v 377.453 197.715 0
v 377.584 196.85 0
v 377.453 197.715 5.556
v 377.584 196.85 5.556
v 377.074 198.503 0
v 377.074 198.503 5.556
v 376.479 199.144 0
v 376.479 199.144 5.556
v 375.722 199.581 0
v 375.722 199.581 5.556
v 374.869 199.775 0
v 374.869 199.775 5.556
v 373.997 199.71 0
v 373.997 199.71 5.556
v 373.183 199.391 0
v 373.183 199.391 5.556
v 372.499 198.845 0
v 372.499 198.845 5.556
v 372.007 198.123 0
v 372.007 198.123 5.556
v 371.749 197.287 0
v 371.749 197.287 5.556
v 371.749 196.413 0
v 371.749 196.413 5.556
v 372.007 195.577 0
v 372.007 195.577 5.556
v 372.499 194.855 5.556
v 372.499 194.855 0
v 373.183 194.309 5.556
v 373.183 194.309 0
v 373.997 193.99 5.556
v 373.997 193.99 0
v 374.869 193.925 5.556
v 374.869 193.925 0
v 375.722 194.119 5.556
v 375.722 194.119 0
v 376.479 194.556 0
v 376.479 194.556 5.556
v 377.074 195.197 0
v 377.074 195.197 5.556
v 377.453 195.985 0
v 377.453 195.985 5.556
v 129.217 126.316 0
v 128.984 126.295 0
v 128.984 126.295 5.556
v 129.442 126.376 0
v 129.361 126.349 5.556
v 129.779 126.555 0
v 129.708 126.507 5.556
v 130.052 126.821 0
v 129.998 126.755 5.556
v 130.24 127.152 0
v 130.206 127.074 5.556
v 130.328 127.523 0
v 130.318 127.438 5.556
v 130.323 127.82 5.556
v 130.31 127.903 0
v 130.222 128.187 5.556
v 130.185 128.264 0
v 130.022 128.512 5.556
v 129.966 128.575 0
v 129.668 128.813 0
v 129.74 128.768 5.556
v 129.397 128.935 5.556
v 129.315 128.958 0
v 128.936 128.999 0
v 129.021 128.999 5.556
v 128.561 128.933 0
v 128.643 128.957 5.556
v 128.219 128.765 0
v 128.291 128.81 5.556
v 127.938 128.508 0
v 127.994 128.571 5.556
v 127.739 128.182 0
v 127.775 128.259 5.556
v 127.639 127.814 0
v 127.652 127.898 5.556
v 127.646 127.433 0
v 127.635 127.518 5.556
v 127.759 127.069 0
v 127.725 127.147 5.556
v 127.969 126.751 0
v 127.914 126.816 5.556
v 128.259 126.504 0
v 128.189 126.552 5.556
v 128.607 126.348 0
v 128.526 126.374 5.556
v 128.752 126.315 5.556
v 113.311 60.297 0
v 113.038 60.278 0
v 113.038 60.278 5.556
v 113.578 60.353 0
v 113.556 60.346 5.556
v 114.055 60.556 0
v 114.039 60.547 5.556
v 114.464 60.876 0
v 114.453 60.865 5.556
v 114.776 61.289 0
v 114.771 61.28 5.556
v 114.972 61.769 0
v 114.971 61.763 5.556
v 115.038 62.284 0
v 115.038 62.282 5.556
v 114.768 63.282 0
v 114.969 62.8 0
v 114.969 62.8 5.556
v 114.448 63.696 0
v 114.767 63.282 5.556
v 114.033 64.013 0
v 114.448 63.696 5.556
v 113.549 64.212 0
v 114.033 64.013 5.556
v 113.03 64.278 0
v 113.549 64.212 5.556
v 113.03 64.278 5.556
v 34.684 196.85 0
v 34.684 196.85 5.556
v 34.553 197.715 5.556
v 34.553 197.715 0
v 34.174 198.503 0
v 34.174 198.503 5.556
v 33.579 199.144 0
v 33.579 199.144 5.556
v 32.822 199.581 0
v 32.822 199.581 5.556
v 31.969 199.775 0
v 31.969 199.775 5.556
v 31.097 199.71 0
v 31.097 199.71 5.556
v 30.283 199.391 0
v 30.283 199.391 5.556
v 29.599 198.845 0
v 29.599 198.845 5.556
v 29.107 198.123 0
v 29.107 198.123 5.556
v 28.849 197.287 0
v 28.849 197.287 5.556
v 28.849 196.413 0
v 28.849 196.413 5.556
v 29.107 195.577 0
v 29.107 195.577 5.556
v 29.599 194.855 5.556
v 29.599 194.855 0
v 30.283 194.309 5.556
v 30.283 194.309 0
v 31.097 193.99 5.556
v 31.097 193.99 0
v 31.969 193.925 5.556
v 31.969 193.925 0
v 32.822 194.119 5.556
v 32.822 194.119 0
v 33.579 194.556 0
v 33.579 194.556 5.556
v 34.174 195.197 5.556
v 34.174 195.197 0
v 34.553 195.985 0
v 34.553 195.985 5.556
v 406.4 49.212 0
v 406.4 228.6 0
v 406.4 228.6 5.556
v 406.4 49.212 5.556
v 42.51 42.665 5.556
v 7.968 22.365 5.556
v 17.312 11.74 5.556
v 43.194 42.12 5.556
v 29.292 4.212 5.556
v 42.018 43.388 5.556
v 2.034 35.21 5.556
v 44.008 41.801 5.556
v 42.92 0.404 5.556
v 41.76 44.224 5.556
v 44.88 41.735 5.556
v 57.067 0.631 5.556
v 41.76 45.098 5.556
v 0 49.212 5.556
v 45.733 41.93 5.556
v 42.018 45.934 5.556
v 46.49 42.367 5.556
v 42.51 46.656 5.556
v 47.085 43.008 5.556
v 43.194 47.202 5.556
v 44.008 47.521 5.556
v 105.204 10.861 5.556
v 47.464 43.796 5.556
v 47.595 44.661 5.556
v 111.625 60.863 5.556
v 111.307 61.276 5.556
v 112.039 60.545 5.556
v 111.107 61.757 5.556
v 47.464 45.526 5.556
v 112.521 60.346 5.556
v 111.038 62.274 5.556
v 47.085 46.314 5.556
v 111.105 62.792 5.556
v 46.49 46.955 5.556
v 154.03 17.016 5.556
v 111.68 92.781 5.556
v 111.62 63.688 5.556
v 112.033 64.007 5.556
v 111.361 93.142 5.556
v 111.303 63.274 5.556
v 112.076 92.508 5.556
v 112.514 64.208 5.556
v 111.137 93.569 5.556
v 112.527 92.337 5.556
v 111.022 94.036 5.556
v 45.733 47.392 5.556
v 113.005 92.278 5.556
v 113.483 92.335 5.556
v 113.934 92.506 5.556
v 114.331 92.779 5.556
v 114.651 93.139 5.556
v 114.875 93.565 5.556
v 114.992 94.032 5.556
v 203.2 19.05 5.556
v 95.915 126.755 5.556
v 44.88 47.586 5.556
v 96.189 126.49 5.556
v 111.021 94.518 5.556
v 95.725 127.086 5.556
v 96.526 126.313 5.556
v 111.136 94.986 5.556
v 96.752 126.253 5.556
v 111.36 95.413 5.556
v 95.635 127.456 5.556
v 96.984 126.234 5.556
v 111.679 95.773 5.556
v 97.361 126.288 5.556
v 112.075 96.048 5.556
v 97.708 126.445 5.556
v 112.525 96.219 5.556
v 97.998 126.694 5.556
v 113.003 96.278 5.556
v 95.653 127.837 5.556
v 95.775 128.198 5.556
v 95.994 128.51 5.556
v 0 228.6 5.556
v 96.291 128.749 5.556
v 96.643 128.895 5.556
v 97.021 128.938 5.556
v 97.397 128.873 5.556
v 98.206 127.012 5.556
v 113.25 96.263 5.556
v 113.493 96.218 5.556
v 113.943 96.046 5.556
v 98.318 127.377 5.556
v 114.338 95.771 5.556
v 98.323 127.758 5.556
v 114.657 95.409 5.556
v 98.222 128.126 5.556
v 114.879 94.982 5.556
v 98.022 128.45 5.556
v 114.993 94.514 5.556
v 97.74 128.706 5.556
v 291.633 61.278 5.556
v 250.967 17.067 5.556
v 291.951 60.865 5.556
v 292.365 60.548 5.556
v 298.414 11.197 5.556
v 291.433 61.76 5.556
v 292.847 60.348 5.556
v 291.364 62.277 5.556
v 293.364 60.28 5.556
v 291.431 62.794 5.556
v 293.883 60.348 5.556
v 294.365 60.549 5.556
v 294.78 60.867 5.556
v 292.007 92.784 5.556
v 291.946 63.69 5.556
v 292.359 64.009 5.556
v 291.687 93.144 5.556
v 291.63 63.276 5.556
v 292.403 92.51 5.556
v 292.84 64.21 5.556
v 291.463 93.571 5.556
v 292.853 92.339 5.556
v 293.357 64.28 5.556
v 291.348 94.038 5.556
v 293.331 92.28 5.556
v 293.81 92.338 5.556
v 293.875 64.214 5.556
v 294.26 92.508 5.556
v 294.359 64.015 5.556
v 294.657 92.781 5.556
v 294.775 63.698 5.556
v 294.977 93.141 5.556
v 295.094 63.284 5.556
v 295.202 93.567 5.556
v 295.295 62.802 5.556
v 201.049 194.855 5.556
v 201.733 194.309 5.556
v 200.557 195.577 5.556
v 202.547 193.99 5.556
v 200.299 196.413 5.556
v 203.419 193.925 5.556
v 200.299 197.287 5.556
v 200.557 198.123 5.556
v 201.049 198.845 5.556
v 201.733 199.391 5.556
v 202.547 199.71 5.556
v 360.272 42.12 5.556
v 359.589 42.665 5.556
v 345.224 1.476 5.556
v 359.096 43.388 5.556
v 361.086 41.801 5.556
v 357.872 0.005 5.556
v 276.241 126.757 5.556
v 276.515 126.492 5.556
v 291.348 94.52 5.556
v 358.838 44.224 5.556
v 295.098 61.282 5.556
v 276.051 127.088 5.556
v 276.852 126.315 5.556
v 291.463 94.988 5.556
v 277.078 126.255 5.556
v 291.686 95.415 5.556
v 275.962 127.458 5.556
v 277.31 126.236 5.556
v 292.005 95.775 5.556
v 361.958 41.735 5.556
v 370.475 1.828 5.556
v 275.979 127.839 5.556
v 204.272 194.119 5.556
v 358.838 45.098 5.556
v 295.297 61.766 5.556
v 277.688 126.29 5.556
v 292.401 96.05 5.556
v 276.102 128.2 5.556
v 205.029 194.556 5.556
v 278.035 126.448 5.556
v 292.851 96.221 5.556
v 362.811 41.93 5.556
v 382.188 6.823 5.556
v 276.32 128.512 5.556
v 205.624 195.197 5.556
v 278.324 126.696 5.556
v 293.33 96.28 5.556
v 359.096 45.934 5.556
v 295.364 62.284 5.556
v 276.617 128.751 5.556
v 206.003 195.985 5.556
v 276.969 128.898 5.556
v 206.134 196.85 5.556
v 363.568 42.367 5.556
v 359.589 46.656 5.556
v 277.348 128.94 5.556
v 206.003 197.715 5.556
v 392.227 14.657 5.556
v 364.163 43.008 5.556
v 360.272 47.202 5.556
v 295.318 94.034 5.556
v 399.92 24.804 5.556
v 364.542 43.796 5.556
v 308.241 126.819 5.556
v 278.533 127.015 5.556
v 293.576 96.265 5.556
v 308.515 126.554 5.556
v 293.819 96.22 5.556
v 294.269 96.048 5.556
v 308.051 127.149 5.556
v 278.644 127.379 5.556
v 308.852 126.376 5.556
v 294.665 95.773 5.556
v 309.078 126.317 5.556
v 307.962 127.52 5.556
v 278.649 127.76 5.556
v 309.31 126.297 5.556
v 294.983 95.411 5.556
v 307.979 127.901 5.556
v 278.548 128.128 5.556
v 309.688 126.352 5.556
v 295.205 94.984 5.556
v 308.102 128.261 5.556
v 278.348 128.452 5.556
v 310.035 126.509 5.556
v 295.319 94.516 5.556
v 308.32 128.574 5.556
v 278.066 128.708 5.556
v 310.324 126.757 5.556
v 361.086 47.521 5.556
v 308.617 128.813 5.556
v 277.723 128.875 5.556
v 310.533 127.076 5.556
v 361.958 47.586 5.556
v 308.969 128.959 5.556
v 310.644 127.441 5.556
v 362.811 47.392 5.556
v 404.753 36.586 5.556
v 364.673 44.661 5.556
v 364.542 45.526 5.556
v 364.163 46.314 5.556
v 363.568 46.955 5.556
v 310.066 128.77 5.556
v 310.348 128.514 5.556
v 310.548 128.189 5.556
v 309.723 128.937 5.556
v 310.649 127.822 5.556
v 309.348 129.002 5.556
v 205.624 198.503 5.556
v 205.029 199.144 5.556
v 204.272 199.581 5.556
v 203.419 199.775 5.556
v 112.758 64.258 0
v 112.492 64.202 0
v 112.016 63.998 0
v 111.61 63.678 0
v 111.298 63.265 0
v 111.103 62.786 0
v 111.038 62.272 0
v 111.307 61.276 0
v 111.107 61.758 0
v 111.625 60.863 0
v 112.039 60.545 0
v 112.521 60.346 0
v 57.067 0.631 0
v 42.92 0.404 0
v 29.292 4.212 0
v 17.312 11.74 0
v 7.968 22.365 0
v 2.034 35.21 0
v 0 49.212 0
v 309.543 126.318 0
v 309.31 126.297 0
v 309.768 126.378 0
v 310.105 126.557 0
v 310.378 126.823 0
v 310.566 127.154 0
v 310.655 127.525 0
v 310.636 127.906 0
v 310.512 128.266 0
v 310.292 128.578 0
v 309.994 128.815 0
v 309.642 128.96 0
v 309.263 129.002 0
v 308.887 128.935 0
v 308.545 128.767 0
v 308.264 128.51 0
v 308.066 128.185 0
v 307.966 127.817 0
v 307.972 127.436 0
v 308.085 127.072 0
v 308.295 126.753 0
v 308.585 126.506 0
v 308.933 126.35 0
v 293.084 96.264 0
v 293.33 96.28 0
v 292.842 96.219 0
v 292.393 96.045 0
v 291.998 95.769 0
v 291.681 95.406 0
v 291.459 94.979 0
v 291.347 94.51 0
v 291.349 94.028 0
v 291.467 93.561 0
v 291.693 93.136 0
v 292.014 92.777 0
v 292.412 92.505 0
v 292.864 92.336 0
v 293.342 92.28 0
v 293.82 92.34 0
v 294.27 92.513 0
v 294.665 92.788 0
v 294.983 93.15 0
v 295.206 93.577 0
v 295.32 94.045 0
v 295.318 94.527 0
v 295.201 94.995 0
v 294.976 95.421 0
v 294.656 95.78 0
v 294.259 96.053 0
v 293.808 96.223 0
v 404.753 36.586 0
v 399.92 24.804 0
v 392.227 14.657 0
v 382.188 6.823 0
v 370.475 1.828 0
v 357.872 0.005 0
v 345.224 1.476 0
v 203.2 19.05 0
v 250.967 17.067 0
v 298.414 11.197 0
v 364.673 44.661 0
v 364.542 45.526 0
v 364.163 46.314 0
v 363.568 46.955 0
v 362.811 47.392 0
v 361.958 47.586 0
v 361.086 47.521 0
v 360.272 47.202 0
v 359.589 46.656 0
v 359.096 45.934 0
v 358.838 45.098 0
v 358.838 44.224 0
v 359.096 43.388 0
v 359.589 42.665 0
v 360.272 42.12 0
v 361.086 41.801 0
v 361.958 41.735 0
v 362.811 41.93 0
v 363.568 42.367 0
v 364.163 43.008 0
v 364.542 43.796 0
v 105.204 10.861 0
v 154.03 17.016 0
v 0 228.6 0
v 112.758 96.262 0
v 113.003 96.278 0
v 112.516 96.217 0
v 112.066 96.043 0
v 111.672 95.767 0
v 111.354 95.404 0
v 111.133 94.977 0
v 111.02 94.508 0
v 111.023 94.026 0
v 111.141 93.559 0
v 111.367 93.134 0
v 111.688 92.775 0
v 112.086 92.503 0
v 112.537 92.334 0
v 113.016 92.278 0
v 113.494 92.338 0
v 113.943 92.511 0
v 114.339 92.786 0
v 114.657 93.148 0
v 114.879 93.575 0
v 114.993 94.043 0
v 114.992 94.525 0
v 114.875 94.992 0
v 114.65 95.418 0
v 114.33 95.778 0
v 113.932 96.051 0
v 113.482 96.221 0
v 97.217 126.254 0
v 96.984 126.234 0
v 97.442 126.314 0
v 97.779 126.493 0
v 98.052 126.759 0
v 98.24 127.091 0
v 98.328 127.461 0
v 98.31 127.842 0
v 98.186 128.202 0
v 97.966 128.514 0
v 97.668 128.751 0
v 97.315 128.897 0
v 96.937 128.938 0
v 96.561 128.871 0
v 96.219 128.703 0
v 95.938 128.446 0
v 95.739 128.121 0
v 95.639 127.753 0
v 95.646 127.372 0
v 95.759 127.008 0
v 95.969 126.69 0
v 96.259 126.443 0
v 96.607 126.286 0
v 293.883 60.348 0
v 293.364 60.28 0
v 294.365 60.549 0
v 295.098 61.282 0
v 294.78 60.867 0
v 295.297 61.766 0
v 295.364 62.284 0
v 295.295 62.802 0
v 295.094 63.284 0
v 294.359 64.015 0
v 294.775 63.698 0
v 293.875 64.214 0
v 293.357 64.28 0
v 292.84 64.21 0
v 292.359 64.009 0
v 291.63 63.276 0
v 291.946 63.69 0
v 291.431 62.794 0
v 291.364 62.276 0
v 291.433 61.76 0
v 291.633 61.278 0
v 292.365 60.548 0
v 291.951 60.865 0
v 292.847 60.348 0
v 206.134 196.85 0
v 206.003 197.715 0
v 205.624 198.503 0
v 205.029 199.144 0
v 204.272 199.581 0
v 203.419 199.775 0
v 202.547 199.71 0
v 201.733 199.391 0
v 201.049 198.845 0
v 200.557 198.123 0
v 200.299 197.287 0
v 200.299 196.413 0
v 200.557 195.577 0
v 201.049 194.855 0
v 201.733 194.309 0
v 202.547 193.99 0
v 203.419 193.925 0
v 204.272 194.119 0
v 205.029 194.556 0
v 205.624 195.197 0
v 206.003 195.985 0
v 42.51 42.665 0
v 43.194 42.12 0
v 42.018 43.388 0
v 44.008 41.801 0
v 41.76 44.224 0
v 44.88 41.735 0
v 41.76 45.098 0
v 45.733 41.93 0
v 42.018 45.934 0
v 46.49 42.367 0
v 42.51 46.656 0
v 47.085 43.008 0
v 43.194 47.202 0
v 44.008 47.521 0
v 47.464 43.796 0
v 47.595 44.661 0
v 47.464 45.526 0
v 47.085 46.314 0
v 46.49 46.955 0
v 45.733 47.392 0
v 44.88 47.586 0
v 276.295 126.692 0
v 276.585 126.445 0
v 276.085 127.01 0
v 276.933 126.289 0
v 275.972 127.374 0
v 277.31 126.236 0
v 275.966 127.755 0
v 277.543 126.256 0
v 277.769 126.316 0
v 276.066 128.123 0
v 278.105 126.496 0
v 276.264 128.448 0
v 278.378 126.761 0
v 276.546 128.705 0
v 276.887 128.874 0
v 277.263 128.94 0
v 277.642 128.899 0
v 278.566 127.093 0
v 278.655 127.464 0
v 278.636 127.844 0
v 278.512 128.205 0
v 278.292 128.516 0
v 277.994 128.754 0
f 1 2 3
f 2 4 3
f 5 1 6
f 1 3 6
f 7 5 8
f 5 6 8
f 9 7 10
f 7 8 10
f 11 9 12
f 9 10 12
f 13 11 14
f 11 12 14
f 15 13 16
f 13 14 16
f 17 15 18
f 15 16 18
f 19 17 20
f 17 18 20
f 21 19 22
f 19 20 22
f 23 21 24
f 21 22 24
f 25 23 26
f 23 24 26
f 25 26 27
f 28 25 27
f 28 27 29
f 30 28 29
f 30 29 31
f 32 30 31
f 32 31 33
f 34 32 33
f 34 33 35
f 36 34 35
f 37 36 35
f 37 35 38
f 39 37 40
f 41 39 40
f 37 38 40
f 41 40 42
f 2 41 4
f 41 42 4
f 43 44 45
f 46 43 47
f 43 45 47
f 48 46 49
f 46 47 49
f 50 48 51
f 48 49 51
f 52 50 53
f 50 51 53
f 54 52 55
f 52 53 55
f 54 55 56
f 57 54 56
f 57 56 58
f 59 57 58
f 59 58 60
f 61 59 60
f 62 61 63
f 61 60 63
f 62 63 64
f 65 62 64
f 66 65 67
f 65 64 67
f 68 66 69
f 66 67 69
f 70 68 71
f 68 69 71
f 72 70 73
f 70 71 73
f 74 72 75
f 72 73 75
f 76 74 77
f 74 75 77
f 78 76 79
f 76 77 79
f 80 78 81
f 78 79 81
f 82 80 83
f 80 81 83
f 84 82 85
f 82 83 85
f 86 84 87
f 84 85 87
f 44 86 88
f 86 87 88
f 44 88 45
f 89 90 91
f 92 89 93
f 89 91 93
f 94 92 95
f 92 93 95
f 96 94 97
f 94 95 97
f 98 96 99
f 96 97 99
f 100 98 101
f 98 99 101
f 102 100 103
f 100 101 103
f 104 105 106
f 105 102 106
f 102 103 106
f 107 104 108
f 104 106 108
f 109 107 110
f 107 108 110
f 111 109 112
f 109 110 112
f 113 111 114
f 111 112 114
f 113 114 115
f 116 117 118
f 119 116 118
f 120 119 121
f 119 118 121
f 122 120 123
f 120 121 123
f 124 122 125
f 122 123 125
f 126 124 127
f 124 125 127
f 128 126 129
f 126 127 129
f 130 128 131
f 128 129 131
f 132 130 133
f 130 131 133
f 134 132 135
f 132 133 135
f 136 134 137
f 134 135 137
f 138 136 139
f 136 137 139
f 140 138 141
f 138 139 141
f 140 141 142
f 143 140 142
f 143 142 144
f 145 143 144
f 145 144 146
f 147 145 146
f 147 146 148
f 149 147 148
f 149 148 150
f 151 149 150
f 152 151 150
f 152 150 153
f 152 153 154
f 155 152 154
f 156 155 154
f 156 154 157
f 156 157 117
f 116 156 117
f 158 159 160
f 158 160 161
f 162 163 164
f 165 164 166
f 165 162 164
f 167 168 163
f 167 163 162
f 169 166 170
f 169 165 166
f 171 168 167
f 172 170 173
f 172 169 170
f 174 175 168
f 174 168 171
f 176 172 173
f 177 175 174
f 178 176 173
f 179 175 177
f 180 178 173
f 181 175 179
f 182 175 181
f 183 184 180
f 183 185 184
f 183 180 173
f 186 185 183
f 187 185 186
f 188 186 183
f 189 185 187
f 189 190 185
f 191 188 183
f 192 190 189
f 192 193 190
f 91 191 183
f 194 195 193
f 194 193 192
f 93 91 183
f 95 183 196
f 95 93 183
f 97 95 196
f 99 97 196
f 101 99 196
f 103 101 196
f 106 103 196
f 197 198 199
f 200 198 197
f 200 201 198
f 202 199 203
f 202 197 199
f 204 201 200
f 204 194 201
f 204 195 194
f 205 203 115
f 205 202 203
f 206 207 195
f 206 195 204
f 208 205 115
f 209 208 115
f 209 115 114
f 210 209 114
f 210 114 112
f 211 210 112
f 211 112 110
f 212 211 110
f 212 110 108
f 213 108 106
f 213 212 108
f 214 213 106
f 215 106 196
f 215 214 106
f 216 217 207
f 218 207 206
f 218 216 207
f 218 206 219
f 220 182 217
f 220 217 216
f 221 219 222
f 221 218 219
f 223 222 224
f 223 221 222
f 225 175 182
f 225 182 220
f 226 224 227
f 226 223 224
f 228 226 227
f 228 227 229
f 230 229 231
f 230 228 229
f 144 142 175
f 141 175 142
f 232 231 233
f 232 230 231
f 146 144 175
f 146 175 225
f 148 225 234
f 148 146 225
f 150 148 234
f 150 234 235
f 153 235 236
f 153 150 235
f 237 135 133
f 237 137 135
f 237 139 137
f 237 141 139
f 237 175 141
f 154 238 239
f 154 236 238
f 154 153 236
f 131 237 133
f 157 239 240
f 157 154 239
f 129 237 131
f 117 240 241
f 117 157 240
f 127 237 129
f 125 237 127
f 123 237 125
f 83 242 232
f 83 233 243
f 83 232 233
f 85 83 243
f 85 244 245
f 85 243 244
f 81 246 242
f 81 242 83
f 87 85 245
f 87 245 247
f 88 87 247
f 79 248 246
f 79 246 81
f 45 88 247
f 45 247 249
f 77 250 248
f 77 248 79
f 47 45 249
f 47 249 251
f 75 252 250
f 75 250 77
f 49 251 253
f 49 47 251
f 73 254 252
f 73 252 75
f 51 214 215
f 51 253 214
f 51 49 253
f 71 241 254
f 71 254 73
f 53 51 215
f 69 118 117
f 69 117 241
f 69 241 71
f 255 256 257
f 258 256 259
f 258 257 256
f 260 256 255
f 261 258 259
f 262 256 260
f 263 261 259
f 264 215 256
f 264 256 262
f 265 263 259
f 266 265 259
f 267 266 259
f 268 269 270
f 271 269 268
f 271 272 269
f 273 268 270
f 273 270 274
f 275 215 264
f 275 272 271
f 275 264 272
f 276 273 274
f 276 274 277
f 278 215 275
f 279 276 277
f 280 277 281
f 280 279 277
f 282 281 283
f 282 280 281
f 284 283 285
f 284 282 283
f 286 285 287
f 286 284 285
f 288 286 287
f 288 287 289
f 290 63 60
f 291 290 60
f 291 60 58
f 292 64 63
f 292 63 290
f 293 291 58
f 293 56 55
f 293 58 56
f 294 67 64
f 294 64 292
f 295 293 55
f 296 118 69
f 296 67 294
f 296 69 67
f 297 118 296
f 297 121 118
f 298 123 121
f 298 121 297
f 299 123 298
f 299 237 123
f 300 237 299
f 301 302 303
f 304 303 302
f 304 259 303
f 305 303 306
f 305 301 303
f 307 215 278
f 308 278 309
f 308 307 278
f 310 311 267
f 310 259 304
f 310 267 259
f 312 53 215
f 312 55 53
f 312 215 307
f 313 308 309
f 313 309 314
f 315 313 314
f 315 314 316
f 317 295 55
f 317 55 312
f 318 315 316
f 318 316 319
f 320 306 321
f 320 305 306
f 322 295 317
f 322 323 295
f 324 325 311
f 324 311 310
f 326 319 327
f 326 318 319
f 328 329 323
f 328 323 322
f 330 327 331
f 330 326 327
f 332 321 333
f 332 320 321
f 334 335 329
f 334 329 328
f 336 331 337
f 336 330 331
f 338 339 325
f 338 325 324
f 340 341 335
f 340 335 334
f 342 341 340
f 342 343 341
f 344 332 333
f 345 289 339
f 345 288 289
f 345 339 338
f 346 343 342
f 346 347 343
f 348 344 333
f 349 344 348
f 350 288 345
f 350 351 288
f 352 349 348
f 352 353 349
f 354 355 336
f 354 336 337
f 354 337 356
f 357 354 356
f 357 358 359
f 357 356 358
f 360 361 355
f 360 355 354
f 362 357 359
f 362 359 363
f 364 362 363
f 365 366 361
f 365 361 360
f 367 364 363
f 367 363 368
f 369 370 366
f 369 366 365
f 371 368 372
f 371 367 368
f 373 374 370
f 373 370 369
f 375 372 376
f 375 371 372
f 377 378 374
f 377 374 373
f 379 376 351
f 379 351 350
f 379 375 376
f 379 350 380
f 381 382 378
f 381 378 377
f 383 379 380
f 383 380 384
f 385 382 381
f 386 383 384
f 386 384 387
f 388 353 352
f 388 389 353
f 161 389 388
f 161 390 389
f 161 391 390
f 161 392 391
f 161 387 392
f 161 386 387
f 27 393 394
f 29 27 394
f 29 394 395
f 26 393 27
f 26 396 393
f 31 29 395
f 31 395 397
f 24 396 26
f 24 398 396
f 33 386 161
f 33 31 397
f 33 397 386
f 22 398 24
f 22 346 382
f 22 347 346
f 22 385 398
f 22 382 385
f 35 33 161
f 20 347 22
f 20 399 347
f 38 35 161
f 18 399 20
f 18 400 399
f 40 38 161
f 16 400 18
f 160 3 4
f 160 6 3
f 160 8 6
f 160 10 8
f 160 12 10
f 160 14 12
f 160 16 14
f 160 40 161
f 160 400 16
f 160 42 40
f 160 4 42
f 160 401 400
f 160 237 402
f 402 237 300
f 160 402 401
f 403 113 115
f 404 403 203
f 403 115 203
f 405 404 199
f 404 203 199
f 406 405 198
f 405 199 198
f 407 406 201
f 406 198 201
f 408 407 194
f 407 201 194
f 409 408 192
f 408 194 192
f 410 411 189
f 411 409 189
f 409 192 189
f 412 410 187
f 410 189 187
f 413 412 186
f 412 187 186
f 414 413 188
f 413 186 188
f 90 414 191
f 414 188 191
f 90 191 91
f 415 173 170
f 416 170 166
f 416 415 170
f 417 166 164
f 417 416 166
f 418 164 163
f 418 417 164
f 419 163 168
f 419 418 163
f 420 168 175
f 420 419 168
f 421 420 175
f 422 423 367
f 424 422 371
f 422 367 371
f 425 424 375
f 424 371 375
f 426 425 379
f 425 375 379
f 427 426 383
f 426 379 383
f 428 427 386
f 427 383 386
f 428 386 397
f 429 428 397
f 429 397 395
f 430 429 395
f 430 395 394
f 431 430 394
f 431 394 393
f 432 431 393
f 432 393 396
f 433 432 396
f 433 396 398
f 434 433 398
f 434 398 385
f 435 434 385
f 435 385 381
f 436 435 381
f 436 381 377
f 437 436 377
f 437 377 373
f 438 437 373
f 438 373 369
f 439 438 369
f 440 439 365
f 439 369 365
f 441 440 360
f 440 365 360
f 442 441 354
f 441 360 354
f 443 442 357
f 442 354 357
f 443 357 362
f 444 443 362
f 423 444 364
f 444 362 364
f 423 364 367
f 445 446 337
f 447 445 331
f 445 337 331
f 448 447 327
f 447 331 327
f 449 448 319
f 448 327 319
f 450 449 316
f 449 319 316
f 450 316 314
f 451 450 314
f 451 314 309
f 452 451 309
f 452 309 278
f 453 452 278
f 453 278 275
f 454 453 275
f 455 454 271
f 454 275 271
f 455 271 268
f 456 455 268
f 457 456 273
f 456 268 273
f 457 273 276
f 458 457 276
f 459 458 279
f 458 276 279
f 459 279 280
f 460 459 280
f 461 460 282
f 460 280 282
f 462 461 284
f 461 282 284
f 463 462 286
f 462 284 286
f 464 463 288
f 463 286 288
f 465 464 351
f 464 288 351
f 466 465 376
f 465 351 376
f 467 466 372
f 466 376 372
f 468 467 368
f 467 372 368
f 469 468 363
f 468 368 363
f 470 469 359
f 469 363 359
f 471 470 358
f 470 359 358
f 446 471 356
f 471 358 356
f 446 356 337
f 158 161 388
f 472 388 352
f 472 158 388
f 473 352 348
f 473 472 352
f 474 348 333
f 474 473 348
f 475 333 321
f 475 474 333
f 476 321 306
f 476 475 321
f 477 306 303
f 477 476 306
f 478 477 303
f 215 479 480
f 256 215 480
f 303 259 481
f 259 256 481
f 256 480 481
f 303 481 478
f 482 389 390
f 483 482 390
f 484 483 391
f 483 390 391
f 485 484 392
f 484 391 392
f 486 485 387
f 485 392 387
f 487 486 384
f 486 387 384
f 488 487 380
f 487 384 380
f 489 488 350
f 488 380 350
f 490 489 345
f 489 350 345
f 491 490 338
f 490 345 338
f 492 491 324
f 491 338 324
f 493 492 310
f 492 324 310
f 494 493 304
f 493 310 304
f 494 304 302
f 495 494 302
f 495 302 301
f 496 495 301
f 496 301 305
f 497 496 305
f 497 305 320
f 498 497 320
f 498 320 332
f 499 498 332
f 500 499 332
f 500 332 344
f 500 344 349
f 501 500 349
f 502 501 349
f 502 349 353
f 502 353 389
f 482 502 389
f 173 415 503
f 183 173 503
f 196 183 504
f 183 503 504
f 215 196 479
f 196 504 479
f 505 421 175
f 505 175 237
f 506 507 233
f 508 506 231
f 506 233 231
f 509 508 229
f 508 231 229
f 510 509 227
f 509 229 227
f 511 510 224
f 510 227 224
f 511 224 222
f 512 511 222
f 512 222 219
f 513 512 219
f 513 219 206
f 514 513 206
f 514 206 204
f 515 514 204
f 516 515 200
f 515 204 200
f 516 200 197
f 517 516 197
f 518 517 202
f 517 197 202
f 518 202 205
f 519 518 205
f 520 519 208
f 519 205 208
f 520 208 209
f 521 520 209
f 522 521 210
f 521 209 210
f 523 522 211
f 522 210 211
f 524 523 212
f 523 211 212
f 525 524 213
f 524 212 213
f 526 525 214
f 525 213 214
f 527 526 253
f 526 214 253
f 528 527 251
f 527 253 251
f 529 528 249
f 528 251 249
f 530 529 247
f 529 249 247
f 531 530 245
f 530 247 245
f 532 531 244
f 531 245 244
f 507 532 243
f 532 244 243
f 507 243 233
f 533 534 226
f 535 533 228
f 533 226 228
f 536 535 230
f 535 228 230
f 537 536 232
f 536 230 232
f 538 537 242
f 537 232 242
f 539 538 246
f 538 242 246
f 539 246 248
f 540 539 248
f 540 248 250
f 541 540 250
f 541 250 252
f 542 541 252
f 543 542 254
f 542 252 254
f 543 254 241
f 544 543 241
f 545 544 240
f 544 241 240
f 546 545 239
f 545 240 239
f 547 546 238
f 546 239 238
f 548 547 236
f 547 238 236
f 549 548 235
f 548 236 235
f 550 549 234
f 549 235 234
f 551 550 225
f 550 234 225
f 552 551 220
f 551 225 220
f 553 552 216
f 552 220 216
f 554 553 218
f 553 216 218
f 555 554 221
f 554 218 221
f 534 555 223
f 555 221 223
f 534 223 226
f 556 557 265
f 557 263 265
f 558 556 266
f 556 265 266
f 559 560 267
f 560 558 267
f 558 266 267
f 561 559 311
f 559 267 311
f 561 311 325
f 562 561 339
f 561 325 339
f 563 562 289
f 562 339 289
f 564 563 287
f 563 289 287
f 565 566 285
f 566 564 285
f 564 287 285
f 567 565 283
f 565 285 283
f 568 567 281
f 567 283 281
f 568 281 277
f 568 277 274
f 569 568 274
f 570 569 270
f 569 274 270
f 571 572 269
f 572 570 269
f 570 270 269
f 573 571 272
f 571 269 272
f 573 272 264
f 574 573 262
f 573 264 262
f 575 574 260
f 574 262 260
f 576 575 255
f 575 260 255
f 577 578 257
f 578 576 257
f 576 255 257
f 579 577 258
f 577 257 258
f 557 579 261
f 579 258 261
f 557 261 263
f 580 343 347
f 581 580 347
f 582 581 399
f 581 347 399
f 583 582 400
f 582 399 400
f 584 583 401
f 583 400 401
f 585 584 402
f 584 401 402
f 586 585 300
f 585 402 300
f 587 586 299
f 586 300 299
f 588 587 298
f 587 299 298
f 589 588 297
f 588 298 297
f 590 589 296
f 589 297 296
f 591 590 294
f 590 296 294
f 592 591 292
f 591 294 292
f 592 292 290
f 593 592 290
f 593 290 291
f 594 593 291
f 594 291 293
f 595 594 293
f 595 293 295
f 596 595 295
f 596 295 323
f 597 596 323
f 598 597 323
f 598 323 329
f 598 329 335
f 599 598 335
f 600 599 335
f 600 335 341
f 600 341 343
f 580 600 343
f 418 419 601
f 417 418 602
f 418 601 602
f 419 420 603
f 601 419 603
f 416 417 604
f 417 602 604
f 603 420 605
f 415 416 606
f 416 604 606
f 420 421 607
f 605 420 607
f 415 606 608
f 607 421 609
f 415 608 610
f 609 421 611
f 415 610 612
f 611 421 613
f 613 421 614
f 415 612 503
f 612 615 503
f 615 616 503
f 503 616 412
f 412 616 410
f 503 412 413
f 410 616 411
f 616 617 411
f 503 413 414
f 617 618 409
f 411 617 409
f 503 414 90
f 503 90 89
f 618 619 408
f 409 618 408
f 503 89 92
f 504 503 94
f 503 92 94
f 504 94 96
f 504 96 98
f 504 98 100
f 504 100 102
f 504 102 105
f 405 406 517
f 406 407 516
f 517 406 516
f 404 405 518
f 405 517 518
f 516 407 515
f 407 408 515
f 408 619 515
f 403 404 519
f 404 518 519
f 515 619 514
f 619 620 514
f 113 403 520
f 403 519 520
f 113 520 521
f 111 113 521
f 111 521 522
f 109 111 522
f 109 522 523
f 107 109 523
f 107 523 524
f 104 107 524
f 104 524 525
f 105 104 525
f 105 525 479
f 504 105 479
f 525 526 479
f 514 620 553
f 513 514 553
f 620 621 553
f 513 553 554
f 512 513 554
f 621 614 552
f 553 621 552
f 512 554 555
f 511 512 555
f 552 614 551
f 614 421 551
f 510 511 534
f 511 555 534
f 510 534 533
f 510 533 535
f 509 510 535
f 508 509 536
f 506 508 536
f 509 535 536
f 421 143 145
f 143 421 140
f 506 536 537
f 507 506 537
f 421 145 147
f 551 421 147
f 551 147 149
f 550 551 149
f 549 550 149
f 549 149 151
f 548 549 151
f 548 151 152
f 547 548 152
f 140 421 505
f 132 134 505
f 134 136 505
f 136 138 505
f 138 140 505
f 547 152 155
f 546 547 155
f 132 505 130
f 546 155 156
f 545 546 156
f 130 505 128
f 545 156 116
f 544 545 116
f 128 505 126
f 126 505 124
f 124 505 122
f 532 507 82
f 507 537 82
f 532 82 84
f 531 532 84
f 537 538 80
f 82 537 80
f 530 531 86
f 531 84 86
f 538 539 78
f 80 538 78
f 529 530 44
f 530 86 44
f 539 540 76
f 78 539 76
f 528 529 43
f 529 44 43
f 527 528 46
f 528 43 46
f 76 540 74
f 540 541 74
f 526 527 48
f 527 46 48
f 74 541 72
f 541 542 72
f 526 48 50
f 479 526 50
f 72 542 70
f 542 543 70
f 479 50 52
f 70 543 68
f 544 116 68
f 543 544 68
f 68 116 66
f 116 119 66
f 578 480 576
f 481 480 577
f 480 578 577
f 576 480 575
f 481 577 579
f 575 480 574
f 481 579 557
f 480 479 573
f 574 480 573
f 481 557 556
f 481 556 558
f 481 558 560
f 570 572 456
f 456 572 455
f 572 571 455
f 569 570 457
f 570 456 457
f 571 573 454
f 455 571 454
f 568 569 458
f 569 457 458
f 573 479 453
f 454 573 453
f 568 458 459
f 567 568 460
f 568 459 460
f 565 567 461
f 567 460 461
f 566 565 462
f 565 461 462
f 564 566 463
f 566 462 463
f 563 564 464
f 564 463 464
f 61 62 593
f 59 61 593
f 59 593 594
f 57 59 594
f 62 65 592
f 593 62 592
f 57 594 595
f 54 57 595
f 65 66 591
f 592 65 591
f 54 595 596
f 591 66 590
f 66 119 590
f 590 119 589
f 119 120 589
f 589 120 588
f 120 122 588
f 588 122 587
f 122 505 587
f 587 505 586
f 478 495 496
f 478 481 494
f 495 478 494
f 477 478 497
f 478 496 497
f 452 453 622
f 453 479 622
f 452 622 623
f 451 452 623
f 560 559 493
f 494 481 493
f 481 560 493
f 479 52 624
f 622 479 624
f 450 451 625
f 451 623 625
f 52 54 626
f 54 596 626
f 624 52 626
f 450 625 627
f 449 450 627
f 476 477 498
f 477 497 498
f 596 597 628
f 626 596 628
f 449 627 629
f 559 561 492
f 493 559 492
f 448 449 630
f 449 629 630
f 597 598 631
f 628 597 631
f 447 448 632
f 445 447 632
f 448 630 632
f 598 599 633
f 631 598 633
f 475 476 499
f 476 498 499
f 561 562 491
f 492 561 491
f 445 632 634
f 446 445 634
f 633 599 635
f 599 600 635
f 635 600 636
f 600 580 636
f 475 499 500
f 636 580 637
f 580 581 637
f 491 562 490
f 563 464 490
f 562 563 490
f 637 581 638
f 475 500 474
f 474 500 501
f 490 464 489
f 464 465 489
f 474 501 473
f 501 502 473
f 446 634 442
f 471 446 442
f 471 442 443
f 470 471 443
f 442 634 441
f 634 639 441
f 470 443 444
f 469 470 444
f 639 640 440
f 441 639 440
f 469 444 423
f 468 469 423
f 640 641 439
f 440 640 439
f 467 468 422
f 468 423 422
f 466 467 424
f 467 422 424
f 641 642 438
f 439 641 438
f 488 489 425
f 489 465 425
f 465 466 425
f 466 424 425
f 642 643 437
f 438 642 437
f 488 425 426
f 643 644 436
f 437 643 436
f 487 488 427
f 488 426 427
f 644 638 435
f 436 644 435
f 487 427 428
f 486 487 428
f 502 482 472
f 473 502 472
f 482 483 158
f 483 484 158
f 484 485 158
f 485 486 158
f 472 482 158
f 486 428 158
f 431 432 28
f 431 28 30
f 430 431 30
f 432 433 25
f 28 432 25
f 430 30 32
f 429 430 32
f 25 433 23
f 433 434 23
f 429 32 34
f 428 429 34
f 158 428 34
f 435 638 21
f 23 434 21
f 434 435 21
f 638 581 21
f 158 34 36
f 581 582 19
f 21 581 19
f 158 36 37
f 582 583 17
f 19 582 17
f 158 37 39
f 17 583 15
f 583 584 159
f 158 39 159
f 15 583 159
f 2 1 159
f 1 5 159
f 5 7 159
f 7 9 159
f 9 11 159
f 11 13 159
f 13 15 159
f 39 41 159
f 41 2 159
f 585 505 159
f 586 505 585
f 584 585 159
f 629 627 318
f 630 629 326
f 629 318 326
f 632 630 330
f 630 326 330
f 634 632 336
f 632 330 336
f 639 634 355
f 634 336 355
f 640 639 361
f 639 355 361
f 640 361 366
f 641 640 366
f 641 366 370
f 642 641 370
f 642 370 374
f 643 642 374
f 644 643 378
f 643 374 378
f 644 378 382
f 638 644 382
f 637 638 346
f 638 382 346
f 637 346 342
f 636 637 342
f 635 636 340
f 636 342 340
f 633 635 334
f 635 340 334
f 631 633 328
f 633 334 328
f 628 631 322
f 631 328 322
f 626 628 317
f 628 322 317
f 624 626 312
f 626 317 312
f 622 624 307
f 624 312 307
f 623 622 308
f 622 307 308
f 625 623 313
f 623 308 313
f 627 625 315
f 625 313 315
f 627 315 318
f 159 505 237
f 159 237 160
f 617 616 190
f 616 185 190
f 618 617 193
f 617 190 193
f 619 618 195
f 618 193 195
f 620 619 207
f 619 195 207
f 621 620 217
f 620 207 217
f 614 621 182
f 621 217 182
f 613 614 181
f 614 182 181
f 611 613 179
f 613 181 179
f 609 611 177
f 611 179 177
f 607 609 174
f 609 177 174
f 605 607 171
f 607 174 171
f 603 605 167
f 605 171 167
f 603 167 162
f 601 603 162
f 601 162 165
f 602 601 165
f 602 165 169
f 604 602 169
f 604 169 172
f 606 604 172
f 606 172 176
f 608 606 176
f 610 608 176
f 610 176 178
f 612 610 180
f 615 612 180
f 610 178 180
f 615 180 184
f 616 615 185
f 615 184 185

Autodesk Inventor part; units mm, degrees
ref_plane "YZ Plane" through (0, 0, 0) normal (1, 0, 0) x (0, 1, 0)
ref_plane "XZ Plane" through (0, 0, 0) normal (0, 1, 0) x (-1, 0, 0)
ref_plane "XY Plane" through (0, 0, 0) normal (0, 0, 1) x (1, 0, 0)
sketch "Sketch1" plane through (0, 0, 0) normal (0, 0, 1) x (1, 0, 0)
  line L0 (49.2125, 0) -> (54.6328, 0)
  line L1 (357.1875, 0) -> (350.9902, 0)
  arc A0 (0, 49.2125) -> (65.0875, 2.6308) centre (49.2125, 49.2125) ccw
  arc A1 (345.2239, 1.4763) -> (406.4, 49.2125) centre (357.1875, 49.2125) ccw
  arc A2 (203.2, 19.05) -> (54.6328, 0) centre (202.8115, -566.7686) ccw
  arc A3 (350.9902, 0) -> (345.2239, 1.4763) centre (202.8115, -566.7686) ccw
  arc A4 (65.0875, 2.6308) -> (54.6328, 0) centre (202.8115, -566.7686) ccw
  arc A5 (350.9902, 0) -> (203.2, 19.05) centre (202.8115, -566.7686) ccw
  line L2 (0, 49.2125) -> (0, 228.6)
  line L3 (406.4, 228.6) -> (406.4, 49.2125)
  line L4 (0, 228.6) -> (406.4, 228.6)
  point P0 (0, 0)
  point P1 (57.0671, 0.6309)
extrude "Extrusion1" add sketch "Sketch1" along normal blind 5.5563 contours A0 L2 L4 L3 A1 A5 A2
sketch "Sketch5" plane through (0, 0, 5.5563) normal (0, 0, 1) x (1, 0, 0)
  line L0 (128.7512, 178.3406) -> (279.9627, 178.3406) construction
  line L1 (279.9627, 178.3406) -> (279.9627, 123.3225) construction
  line L2 (279.9627, 123.3225) -> (128.7512, 123.3225) construction
  line L3 (128.7512, 123.3225) -> (128.7512, 178.3406) construction
  point P0 (0, 0)
sketch "Sketch6" plane through (0, 0, 5.5563) normal (0, 0, 1) x (1, 0, 0)
  line L0 (406.4, 228.6) -> (0, 228.6)
  line L1 (0, 228.6) -> (0, 49.2125)
  circle A0 centre (31.75, 196.85) radius 2.9337
  line L2 (406.4, 49.2125) -> (406.4, 228.6)
  circle A1 centre (374.65, 196.85) radius 2.9337
  circle A2 centre (203.2, 196.85) radius 2.9337
  arc A3 (345.2239, 1.4763) -> (406.4, 49.2125) centre (357.1875, 49.2125) ccw
  circle A4 centre (361.7391, 44.6609) radius 2.9337
  arc A5 (0, 49.2125) -> (57.0671, 0.6309) centre (49.2125, 49.2125) ccw
  circle A6 centre (44.6609, 44.6609) radius 2.9337
  point P0 (0, 0)
  point P1 (0, 0)
extrude "Extrusion6" cut sketch "Sketch6" against normal up to surface (5.5563 mm away)
sketch "Sketch7" plane through (0, 0, 5.5563) normal (0, 0, 1) x (1, 0, 0)
  ellipse E0 centre (293.3334, 94.2801) end of major axis (293.3295, 96.2801) minor radius 2
  ellipse E1 centre (293.3643, 62.2802) end of major axis (293.3569, 64.2802) minor radius 2
  circle A0 centre (361.7412, 44.6631) radius 2.9337
  line L0 (361.7412, 44.6631) -> (293.3643, 44.6631)
  line L1 (293.3643, 44.6631) -> (293.3643, 62.2802)
  ellipse E2 centre (113.007, 94.278) end of major axis (113.0032, 96.278) minor radius 2
  ellipse E3 centre (113.0379, 62.2781) end of major axis (113.0305, 64.2781) minor radius 2
  line L2 (113.0379, 44.6609) -> (113.0379, 62.2781)
  circle A1 centre (293.3643, 78.2802) radius 4.699
  circle A2 centre (113.0379, 78.278) radius 4.699
  circle A3 centre (44.6609, 44.6609) radius 2.9337
  line L3 (44.6609, 44.6609) -> (113.0379, 44.6609)
  point P0 (0, 0)
  point P1 (0, 0)
  dimension "d59" = 17.6171
  dimension "d60" = 68.3769
  dimension "d61" = 17.6171
  dimension "d62" = 9.398
  dimension "d63" = 9.398
  dimension "d64" = 68.3769
extrude "Extrusion7" cut sketch "Sketch7" against normal through all contours E0 | E1 | E2 | E3
sketch "Sketch8" plane through (0, 0, 5.5563) normal (0, 0, 1) x (1, 0, 0)
  ellipse E0 centre (309.3078, 127.6497) end of major axis (309.3104, 126.2971) minor radius 1.3525
  ellipse E1 centre (277.3079, 127.5882) end of major axis (277.3105, 126.2356) minor radius 1.3525
  ellipse E2 centre (293.3334, 94.2801) end of major axis (293.3295, 96.2801) minor radius 2
  ellipse E3 centre (293.3334, 94.2801) end of major axis (293.3295, 96.2801) minor radius 2 projected
  ellipse E4 centre (128.9815, 127.6475) end of major axis (128.9841, 126.295) minor radius 1.3525
  ellipse E5 centre (96.9816, 127.586) end of major axis (96.9842, 126.2335) minor radius 1.3525
  ellipse E6 centre (113.007, 94.278) end of major axis (113.0032, 96.278) minor radius 2
  ellipse E7 centre (113.007, 94.278) end of major axis (113.0032, 96.278) minor radius 2 projected
  point P0 (0, 0)
extrude "Extrusion8" cut sketch "Sketch8" against normal through all contours E0 | E1 | E4 | E5
properties part number "FTC Outside Panels" material "Wood (Oak)"
